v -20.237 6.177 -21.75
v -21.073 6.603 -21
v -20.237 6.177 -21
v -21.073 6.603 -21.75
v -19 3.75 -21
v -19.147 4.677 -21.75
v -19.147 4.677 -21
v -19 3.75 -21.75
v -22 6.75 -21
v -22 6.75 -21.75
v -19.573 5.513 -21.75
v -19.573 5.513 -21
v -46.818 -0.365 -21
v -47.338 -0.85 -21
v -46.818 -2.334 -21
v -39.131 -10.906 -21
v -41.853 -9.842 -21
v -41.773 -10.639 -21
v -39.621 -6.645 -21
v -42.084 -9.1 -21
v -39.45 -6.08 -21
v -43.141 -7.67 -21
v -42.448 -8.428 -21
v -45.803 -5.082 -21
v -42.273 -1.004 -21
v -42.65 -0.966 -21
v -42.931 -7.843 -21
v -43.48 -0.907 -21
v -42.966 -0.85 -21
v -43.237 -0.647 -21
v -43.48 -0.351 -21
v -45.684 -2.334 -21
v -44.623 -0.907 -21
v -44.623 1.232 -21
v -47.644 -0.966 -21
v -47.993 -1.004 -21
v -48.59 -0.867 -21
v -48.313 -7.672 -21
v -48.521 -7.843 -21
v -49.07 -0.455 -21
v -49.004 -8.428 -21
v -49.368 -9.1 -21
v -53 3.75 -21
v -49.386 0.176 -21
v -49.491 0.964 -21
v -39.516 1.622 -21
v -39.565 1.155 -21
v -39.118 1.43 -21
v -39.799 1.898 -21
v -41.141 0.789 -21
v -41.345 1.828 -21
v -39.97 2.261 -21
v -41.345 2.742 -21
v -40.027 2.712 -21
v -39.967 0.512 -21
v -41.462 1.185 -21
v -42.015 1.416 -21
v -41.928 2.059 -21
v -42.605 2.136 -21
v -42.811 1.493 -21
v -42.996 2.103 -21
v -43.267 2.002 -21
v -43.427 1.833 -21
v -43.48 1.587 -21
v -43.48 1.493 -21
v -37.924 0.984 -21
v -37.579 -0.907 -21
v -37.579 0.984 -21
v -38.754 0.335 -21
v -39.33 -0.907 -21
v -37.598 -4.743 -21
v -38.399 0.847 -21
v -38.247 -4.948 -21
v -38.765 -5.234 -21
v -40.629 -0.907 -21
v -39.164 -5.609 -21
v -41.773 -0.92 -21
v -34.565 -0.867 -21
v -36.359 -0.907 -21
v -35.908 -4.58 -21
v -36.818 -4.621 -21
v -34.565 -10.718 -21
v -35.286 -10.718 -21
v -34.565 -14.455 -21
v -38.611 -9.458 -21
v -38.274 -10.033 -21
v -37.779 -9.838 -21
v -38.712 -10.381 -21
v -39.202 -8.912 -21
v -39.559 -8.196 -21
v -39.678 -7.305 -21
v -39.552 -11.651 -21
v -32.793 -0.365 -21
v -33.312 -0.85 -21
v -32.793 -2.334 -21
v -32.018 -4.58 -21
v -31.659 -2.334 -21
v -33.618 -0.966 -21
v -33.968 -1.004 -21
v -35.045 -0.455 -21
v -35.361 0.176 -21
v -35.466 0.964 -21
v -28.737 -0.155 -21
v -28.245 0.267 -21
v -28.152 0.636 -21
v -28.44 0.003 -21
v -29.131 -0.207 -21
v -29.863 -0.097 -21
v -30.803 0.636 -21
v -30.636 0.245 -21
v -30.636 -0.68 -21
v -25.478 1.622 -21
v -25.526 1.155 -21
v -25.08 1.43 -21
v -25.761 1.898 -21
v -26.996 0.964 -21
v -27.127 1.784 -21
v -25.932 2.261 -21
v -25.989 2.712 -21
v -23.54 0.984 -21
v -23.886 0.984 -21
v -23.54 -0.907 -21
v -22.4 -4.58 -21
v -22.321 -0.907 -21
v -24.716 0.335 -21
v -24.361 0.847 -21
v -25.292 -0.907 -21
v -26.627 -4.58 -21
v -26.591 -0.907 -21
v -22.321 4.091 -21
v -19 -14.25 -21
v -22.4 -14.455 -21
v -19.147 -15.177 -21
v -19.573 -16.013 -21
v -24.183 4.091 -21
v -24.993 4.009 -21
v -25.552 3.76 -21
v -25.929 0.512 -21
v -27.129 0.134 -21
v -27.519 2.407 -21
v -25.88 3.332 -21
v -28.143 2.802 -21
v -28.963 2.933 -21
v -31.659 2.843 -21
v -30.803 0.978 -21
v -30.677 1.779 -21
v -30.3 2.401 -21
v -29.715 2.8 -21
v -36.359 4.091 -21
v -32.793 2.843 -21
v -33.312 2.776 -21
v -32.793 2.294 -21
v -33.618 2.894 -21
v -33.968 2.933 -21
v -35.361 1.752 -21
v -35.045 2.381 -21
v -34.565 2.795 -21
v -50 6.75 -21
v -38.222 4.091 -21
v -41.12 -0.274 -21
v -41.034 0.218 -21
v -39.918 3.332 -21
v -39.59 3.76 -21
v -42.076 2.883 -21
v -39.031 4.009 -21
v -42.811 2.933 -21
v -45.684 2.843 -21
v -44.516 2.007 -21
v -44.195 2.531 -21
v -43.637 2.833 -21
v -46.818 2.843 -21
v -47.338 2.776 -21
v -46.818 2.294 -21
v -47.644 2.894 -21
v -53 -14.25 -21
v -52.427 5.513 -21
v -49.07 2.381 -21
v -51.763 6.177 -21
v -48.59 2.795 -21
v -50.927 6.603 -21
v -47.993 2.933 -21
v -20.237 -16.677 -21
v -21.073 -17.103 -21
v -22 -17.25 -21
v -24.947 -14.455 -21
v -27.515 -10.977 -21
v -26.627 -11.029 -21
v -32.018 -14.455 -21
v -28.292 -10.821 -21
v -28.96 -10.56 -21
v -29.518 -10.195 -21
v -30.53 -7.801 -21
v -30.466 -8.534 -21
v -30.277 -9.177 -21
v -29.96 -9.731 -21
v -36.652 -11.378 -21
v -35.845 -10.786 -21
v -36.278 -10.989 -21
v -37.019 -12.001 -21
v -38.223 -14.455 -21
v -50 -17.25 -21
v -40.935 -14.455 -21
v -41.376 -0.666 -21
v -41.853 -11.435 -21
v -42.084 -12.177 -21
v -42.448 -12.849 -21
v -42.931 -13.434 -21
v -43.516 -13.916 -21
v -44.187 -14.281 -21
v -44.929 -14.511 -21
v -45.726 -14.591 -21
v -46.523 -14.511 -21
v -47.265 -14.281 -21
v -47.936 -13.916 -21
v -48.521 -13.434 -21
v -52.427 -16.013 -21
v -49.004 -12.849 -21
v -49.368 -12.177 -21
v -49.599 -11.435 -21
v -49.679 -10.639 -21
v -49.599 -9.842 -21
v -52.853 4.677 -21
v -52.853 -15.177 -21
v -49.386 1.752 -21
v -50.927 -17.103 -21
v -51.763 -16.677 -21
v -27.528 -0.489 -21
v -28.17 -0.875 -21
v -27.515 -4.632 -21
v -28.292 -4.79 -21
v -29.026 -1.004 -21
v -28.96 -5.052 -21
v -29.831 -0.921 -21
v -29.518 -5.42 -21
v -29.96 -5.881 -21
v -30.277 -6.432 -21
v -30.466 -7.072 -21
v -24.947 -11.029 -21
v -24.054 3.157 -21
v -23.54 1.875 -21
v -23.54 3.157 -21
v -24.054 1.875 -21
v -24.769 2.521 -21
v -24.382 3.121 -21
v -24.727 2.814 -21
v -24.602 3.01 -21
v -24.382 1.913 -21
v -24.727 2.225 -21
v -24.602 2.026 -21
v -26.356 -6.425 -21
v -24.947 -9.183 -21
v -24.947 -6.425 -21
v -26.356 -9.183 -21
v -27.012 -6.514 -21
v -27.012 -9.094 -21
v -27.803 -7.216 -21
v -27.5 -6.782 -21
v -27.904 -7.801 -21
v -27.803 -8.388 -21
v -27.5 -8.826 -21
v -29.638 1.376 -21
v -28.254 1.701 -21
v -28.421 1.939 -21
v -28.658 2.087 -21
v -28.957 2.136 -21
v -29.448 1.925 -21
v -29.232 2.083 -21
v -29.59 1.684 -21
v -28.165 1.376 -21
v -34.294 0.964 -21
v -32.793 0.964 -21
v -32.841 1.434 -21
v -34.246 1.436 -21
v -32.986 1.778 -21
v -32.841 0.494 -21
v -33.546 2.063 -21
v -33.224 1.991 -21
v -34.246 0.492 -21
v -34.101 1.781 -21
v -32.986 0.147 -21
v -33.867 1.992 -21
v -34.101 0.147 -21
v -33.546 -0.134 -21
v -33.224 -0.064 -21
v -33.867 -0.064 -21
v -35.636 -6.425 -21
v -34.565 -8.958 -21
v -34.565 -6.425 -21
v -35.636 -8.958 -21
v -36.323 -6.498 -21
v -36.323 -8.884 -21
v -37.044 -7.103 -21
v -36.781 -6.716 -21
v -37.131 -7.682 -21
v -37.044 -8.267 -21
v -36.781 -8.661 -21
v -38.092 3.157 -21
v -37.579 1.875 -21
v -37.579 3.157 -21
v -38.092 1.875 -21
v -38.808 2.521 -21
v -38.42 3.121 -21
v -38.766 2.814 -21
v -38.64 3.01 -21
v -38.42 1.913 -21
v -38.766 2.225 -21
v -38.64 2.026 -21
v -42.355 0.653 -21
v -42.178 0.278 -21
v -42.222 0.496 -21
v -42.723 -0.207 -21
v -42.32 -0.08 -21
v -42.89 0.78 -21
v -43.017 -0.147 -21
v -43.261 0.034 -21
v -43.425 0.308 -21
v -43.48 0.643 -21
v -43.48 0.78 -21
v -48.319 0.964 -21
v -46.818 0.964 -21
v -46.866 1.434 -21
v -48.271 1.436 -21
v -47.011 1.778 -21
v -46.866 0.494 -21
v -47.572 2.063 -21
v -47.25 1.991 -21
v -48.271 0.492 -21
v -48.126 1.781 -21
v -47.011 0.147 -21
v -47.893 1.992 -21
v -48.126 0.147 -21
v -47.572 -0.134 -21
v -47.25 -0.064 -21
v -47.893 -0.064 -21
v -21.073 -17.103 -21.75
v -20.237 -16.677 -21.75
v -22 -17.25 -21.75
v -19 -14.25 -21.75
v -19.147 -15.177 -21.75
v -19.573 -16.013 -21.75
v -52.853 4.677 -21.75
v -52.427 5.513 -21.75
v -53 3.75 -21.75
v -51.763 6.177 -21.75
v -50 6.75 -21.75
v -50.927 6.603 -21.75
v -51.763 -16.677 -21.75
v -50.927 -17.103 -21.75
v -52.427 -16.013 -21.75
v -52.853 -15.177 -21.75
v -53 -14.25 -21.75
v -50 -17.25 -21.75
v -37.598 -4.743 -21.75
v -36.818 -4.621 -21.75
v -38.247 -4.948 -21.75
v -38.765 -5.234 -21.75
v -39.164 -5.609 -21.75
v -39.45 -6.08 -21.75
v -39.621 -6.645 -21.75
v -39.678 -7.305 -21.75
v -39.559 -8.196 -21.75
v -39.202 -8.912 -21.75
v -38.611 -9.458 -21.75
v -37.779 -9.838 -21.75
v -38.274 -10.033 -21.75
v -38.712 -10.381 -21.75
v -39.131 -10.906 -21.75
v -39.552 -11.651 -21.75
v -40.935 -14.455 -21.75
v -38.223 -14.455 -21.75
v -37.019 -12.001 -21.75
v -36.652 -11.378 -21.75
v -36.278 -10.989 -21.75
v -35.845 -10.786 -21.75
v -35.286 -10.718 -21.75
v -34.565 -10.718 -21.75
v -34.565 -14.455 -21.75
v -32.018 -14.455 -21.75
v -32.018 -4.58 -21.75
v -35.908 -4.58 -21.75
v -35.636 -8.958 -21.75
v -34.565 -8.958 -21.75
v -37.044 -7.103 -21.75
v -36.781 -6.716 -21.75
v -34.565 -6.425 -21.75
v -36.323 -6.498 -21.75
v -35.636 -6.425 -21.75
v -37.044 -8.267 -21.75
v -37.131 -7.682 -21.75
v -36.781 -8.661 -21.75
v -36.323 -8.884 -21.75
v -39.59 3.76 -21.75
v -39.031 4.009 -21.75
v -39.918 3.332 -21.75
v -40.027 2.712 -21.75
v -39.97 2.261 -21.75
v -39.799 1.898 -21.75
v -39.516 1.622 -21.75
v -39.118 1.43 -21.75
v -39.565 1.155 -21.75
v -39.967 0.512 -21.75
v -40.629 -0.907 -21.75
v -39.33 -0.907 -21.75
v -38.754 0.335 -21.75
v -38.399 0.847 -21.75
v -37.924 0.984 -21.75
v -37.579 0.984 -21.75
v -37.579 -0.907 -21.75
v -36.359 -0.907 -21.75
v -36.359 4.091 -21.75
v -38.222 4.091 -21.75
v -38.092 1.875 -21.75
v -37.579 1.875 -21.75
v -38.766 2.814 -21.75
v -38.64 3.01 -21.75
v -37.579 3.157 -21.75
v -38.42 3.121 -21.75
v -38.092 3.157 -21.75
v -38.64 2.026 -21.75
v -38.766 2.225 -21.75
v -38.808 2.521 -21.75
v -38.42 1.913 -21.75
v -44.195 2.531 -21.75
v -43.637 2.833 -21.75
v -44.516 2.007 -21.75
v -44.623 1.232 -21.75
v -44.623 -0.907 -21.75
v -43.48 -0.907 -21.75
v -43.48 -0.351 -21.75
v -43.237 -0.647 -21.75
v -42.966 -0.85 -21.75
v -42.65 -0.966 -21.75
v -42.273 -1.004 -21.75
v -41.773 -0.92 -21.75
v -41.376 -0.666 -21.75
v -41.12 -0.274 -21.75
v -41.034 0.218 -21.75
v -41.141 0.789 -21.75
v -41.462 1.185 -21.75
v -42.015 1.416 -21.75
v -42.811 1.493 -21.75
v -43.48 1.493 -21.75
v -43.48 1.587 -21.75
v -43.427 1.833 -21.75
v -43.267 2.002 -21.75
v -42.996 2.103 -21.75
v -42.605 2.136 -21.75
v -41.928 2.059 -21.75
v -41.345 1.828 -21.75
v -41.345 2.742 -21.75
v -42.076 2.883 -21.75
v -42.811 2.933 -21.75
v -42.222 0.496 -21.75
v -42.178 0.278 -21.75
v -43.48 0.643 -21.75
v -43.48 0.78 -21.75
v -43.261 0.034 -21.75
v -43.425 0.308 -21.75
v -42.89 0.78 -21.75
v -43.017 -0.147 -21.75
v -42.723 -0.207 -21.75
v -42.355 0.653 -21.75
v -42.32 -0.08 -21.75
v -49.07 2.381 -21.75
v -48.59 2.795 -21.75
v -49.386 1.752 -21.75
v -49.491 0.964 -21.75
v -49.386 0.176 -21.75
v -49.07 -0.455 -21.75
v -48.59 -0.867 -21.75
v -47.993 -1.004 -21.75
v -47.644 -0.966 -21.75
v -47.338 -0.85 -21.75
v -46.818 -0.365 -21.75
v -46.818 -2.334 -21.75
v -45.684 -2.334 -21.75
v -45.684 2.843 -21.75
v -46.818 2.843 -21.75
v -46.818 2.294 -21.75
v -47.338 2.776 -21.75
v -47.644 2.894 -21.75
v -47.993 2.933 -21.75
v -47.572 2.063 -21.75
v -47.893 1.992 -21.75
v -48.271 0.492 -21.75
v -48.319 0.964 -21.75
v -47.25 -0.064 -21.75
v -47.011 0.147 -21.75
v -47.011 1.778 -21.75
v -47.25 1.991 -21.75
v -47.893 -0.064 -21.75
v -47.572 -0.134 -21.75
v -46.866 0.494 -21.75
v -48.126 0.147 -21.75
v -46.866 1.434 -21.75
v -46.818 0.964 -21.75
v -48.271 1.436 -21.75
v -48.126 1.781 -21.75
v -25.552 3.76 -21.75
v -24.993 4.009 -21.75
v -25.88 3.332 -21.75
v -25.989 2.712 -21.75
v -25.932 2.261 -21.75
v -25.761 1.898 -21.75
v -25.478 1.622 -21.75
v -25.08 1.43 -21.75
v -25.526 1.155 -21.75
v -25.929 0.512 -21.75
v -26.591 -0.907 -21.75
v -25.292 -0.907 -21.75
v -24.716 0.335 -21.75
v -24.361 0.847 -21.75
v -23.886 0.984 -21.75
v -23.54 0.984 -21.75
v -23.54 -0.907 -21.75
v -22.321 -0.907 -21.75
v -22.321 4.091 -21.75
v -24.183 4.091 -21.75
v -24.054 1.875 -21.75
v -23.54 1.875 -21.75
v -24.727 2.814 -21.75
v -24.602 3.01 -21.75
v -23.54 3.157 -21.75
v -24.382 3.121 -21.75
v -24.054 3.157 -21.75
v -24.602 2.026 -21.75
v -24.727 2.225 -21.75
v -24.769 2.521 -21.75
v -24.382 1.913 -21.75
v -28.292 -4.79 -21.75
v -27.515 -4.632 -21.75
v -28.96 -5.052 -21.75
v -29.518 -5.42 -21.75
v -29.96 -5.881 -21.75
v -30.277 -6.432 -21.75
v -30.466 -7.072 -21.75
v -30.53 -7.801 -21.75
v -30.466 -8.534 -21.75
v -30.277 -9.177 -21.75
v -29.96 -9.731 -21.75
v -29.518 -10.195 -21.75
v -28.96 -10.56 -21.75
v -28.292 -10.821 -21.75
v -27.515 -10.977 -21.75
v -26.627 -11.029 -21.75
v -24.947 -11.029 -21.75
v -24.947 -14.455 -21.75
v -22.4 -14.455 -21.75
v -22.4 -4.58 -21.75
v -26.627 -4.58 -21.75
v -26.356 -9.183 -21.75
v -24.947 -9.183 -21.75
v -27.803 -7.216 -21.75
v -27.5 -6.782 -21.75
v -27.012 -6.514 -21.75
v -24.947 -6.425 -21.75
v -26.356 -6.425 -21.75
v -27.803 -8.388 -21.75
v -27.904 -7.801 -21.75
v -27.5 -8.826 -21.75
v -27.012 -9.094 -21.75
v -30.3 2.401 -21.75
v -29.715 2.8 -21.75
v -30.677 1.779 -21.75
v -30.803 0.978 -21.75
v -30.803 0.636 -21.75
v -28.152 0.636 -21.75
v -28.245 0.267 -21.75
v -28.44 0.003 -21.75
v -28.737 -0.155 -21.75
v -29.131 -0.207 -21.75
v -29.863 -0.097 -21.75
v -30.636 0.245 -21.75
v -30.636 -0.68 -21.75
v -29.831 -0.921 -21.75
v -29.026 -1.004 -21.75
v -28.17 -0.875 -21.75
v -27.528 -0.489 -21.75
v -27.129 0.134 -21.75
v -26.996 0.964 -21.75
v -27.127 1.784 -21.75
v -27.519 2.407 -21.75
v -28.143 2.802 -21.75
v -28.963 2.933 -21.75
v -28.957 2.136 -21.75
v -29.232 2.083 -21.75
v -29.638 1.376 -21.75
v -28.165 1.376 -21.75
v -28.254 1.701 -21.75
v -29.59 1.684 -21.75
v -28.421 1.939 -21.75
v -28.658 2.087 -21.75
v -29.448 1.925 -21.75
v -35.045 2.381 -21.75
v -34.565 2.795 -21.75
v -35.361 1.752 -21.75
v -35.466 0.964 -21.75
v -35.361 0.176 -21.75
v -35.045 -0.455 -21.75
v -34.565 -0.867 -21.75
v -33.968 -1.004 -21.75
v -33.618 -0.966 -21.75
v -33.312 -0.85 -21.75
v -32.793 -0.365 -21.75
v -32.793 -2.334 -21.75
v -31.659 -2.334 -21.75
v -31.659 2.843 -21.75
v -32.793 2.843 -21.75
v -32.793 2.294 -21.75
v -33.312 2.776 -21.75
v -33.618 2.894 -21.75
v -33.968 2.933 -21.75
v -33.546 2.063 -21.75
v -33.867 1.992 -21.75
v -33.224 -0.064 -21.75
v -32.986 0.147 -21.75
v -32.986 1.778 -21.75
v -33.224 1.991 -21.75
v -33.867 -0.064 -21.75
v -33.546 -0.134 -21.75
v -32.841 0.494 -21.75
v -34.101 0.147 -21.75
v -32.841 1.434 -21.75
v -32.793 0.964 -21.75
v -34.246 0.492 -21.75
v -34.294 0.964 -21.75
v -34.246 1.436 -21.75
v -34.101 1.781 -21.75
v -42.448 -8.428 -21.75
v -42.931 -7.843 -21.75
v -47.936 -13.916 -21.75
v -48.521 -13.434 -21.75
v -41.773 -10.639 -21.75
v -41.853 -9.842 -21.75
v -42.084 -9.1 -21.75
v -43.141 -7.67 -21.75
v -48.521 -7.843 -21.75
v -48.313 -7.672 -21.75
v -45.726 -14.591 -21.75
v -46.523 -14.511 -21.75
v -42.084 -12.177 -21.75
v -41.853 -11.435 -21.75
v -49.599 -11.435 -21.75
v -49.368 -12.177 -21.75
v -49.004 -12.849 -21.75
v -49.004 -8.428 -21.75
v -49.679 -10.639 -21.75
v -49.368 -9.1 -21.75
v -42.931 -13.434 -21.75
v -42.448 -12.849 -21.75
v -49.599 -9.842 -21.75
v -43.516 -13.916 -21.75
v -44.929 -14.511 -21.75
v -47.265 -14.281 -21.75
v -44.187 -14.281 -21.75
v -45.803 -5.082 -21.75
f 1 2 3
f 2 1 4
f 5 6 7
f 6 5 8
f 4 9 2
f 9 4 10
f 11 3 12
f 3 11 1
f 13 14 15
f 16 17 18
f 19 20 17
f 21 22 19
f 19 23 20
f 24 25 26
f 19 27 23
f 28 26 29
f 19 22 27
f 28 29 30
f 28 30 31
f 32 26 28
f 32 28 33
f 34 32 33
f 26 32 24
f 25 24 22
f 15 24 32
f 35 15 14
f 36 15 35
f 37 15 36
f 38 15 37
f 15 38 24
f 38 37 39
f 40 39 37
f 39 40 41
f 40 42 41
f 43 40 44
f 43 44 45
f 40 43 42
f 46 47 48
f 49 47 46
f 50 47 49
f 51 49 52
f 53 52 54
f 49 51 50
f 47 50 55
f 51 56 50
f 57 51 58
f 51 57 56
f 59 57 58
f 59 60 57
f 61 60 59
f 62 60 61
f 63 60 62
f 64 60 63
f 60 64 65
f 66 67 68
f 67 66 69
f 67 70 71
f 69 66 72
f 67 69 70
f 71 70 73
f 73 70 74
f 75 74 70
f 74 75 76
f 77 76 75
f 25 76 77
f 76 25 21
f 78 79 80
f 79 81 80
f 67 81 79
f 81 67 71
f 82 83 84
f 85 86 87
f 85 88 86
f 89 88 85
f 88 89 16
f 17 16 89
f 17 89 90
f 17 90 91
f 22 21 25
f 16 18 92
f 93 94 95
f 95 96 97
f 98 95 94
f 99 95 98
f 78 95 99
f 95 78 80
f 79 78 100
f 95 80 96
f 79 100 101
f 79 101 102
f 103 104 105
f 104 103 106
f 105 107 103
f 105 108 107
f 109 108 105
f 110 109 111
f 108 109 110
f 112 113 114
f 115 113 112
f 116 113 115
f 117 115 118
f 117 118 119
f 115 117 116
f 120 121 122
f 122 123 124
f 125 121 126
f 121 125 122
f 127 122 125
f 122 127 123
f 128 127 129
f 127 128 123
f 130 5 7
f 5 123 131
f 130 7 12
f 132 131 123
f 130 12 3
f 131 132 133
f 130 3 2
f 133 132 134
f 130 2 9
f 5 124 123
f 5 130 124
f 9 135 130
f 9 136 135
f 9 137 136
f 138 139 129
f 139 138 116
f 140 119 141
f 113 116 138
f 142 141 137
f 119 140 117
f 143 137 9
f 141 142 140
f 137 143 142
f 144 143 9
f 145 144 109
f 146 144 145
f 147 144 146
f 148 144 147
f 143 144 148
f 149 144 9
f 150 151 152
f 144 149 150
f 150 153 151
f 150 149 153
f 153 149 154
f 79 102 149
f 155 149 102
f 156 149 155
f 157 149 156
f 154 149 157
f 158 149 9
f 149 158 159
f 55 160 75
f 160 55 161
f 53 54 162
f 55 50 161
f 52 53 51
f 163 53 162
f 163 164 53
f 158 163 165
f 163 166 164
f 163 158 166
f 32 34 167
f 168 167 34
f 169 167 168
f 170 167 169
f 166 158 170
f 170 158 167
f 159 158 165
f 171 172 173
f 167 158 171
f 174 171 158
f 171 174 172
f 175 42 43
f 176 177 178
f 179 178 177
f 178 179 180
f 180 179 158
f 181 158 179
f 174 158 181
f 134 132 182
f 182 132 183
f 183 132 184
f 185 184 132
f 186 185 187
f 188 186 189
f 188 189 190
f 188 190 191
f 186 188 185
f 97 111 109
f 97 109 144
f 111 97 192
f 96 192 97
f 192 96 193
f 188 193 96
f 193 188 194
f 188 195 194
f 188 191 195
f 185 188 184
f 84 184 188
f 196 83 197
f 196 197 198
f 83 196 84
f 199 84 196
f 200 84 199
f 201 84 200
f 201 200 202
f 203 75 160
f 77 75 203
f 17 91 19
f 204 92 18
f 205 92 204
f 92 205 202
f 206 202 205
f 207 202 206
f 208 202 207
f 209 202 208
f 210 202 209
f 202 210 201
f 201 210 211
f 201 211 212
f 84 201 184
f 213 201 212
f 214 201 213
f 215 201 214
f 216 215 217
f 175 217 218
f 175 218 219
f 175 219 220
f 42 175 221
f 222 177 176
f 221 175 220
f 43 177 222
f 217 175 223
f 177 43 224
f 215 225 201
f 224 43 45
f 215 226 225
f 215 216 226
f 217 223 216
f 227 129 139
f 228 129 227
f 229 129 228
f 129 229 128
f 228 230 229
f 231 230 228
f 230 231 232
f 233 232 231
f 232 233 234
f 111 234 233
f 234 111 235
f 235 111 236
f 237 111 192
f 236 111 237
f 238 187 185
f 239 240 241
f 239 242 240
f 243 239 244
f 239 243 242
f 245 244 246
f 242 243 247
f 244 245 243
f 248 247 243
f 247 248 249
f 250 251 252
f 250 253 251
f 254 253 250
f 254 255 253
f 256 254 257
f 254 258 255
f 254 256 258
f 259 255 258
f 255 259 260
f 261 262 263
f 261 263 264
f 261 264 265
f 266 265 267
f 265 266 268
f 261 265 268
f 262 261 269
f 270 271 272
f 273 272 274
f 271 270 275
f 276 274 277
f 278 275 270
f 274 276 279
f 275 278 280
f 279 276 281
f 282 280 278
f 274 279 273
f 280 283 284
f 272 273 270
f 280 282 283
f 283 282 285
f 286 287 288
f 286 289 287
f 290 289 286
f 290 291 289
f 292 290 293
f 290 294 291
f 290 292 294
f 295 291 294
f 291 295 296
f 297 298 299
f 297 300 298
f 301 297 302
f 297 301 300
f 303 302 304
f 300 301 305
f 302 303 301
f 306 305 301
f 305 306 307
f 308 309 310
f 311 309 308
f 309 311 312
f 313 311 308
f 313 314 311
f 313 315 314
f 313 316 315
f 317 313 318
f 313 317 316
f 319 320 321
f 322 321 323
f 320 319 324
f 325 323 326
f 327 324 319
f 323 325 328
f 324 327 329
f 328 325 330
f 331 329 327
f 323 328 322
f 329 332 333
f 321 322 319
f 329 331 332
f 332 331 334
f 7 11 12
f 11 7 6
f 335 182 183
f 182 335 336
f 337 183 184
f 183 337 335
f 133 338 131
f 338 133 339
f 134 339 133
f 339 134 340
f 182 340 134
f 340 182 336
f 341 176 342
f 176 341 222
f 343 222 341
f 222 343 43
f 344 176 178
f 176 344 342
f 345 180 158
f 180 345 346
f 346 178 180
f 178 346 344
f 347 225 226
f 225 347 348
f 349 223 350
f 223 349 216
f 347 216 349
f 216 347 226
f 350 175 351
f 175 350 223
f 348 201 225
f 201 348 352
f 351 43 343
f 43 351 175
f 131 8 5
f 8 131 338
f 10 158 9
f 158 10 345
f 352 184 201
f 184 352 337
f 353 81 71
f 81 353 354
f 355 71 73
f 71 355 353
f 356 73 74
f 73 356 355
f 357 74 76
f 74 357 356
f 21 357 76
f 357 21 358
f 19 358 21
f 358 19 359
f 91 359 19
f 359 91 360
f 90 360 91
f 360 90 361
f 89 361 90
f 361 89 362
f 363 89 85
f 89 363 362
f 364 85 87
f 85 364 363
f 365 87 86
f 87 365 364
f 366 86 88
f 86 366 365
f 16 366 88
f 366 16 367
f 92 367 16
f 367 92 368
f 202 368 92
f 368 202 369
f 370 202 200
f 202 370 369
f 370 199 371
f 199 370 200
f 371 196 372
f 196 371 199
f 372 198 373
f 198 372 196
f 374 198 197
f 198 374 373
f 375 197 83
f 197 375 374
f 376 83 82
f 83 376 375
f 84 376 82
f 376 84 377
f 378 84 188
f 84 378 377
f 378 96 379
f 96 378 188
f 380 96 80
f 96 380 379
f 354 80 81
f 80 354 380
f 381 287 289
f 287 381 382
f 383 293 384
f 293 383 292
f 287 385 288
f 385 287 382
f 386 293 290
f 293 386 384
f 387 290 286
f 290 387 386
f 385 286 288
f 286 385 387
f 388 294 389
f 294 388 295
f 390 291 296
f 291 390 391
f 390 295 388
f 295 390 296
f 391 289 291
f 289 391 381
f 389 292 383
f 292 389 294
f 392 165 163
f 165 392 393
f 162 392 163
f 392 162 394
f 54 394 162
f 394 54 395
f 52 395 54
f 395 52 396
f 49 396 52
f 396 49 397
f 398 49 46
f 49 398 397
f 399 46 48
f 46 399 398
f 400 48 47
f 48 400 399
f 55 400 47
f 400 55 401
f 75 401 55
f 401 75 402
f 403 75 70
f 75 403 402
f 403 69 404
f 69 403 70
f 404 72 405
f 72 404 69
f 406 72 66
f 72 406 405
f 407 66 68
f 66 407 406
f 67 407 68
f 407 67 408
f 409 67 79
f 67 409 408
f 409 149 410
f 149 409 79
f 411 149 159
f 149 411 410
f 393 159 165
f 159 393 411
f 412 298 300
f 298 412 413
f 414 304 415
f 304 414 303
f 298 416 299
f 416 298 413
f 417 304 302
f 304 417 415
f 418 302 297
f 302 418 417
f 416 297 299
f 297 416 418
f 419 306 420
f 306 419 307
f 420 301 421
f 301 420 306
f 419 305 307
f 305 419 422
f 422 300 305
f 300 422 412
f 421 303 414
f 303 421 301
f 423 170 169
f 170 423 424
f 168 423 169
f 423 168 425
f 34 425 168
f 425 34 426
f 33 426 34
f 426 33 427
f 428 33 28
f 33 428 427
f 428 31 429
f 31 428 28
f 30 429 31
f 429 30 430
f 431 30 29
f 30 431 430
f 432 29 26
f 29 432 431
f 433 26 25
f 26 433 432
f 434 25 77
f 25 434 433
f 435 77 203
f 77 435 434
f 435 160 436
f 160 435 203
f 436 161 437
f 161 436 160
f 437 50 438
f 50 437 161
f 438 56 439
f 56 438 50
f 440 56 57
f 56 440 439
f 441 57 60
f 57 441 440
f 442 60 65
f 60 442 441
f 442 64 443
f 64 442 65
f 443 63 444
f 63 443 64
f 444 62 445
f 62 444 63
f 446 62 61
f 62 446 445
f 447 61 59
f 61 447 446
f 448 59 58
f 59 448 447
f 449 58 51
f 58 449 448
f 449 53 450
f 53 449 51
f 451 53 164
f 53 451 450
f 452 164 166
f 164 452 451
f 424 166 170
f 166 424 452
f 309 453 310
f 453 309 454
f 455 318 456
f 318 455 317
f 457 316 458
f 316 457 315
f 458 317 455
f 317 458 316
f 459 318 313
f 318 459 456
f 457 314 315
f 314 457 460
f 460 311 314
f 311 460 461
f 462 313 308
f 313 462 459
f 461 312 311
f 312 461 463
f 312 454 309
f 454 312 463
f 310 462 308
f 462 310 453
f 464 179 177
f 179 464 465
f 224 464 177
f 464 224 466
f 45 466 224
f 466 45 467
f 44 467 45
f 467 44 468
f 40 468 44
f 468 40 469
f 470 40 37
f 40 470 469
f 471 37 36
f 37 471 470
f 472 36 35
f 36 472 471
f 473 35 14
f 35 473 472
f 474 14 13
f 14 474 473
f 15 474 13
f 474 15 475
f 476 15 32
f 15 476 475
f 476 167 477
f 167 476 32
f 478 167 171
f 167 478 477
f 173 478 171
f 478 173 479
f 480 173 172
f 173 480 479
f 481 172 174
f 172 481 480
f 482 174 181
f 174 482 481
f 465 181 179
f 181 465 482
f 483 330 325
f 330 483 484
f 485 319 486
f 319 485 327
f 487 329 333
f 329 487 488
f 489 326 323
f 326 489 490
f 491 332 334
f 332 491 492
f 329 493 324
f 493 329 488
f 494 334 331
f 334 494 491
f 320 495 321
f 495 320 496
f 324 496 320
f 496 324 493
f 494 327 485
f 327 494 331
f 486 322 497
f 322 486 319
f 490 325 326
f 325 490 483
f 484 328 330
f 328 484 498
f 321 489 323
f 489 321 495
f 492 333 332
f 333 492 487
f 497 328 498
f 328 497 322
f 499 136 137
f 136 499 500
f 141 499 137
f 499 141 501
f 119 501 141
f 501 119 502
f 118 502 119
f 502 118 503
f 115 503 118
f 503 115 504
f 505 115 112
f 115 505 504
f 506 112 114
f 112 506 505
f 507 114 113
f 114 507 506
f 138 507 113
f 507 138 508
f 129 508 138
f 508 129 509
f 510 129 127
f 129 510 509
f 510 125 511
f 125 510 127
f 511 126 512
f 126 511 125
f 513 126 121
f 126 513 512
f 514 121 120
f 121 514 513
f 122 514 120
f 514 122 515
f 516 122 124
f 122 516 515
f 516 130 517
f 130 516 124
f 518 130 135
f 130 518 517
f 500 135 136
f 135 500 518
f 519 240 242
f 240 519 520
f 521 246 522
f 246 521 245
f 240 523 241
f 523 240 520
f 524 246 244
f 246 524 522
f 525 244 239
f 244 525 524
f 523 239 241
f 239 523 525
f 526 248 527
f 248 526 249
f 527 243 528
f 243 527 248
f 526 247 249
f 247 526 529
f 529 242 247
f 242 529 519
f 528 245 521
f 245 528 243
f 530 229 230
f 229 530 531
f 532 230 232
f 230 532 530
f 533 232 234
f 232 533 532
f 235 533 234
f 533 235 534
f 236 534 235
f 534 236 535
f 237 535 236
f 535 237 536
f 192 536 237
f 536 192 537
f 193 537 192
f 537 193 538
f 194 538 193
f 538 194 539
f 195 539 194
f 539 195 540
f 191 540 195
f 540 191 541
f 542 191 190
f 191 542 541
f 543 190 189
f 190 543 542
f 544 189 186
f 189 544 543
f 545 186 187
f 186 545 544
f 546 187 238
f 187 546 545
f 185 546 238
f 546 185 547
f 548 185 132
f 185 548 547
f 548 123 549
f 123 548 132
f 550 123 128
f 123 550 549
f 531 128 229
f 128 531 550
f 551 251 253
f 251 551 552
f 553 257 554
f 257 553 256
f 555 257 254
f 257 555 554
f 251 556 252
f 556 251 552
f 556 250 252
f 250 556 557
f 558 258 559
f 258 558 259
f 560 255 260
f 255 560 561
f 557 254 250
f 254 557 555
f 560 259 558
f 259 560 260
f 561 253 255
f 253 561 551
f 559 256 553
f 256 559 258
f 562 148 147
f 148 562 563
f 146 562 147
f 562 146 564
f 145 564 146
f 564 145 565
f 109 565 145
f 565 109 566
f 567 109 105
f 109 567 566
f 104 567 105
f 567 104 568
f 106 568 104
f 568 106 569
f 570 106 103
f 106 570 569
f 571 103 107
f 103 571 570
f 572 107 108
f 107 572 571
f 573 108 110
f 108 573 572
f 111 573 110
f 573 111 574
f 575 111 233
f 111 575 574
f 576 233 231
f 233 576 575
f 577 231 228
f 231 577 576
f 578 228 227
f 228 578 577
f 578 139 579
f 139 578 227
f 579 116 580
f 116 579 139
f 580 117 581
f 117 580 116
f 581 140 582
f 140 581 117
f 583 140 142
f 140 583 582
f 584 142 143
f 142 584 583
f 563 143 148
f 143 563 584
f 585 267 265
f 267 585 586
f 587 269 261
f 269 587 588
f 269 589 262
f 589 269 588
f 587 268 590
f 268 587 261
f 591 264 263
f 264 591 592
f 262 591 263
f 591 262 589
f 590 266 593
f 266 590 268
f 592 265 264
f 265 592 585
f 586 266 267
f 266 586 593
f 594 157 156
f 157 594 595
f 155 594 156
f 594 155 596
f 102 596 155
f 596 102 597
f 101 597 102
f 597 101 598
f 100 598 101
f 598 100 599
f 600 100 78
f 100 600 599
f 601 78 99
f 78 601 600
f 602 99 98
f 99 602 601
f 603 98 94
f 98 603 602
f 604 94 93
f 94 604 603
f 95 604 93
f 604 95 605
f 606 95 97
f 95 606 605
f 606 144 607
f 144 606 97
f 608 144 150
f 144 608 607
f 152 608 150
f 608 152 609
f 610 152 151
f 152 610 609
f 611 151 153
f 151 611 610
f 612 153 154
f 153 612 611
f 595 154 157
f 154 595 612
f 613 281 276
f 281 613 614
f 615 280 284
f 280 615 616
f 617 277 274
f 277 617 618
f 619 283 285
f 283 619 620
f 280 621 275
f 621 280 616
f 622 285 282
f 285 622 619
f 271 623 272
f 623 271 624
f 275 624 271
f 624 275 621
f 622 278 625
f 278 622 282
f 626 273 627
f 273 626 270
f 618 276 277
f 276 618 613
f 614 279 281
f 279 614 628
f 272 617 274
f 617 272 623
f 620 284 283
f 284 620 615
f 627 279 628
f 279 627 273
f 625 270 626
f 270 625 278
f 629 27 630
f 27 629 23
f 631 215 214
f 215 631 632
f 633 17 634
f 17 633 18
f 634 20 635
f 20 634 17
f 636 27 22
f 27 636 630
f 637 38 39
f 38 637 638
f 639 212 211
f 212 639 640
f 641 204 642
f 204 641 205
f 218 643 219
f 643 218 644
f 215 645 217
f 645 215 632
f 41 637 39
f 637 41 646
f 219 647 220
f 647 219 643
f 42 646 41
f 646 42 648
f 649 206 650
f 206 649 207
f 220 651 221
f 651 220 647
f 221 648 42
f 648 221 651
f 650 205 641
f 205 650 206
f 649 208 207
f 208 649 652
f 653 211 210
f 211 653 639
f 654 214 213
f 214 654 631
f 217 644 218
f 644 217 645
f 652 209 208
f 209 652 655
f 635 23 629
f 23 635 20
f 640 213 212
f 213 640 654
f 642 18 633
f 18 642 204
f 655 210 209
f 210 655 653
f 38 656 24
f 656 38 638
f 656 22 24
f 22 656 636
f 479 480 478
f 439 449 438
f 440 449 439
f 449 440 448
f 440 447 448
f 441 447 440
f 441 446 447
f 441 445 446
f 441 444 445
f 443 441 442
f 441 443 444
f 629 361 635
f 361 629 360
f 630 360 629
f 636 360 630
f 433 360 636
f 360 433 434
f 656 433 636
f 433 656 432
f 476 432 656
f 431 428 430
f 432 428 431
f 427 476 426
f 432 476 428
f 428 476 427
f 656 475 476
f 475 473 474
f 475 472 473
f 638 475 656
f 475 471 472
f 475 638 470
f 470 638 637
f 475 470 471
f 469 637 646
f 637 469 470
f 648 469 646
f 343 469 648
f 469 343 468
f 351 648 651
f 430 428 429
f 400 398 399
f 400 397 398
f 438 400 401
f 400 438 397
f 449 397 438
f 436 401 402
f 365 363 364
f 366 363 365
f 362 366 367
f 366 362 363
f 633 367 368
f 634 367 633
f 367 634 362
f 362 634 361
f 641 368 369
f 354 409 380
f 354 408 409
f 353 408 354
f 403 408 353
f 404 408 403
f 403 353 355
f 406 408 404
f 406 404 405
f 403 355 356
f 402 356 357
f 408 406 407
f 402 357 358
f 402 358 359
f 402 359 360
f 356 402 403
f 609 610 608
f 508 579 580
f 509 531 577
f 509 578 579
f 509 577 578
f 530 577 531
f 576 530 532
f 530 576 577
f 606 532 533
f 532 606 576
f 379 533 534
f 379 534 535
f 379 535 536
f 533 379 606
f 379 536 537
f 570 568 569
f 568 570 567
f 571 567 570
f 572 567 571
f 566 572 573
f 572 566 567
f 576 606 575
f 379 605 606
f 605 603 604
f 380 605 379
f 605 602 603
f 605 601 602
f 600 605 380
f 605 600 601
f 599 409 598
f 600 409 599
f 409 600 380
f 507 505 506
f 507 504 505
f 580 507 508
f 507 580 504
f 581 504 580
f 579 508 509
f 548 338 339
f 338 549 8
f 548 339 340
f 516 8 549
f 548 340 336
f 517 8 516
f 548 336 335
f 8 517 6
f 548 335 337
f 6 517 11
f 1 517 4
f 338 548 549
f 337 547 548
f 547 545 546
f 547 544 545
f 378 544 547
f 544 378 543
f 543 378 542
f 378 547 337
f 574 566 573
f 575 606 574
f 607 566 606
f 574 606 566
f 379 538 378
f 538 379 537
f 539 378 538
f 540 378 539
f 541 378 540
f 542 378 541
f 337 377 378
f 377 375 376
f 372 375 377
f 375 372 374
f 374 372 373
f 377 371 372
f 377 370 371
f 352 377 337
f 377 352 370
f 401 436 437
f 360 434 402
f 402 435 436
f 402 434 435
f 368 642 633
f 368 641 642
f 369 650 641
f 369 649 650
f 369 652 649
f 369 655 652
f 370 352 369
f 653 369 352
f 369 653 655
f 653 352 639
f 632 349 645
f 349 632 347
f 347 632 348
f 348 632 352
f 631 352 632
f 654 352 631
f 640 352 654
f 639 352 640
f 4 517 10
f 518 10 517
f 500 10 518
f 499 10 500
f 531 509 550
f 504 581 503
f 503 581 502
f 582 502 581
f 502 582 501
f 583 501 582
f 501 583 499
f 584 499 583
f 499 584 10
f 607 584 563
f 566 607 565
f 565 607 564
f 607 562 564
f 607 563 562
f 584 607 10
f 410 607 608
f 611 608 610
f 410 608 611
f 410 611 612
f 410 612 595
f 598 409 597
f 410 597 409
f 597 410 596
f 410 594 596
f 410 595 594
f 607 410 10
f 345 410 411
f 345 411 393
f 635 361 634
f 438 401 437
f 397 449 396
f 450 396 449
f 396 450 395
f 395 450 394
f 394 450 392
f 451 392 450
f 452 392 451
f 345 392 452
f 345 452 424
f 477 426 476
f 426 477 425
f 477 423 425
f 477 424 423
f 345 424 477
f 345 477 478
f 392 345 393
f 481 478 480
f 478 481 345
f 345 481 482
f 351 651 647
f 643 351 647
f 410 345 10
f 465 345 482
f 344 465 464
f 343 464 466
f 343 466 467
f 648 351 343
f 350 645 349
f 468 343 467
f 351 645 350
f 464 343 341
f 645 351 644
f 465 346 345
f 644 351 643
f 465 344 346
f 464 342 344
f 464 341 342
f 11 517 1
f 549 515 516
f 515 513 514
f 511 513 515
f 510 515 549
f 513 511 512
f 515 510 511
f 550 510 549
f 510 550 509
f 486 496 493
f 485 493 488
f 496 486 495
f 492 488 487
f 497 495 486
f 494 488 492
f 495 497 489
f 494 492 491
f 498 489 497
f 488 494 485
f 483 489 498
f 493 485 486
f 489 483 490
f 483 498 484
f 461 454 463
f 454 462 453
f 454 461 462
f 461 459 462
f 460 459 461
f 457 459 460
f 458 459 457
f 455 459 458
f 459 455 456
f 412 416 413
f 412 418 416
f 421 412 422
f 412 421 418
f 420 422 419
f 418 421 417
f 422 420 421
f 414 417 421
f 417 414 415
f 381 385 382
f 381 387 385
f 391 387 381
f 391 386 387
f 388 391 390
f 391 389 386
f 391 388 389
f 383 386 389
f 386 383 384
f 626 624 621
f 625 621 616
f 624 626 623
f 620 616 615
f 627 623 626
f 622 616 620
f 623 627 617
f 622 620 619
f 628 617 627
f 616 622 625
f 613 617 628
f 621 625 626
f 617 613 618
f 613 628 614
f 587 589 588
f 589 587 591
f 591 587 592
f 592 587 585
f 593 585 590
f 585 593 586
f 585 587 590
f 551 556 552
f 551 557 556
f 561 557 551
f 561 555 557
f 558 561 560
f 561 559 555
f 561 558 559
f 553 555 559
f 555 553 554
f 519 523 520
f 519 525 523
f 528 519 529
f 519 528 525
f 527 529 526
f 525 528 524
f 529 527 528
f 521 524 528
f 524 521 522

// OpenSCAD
/*

	Power supply cover for 12V 20A supply.

	Adrian Bowyer
	April 2012

	Licence: GPL
*/


zi=41;              // internal height
xi=112;            // Internal width
yi=51;              // Internal depth
thick=2.5;        // Wall thickness
screw_y=26;   // Retaining screw coord
screw_z=37;   // Retaining screw coord
screw_d=3.3;  //  Retaining screw diameter
head_d=6;       //  Retaining screw head diameter
fixz=34;           // Retaining cone z coord
catchy=10;  	// catch y pos
catcha=10;
catchb=10;
catchc=25;
catchoff=[catcha/2-6,0,catchc-21+5];
c8x=23;           // IEC C8 rectangle size X
c8y=18;           // IEC C8 rectangle size Y
c8holes=30;   //  IEC C8 mounting hole centres
wx = 7;             // Low voltage wire size X
wy = 3.5;         // Low voltage wire size Y
wthick=4;        // Wire clamp thickness
whigh=20;      // Wire clamp height
wlong=20;      // Wire clamp length
basez=14;      // Indentation for bottom sheet
wallx=54;       // Wall between mains and low-voltage side
walldent1 = 50; //Wall indentations to accommodate screw connector etc
walldent2=60;
walldent3=35;

clampxyz=[-xi/2 + wlong/2 + 10, yi/2 - (wy+wthick*2)/2 - 5, -zi/2 + whigh/2 - 0.5];
logoxyz=clampxyz-[0,20,11];
screwxyz=[-xi/2, yi/2-screw_y, -zi/2 +screw_z];
catchxyz=[(xi-catcha)/2,-(yi-catchb)/2 + catchy,-(zi-catchc)/2];


//ps_cover();

intersection() { logo(); body(); }

module logo()
{
	color("green")

	translate(logoxyz)
	rotate([0,180,0])
	difference()
	{
		union()
		{
			cube([34,18,2],center=true);
			cube([28,24,2],center=true);
			for(i=[-1,1])
			{
				translate([i*(34/2-3), 18/2,0])
					cylinder(r=3,h=2,center=true,$fn=20);
				translate([i*(34/2-3),-18/2 ,0])
					cylinder(r=3,h=2,center=true,$fn=20);
			}
		}
		translate([0,0,-2.5])
		union()
		{
			poly_path3033(5);
			poly_path3045(5);
			poly_path2894(5);
			poly_path3047(5);
			poly_rect3668(5);
			poly_path3049(5);
			poly_path3039(5);
			poly_path3036(5);
			poly_path3041(5);
			poly_path3043(5);
		}
	}

}

module body()
{
			difference()
			{
				cube([xi+2*thick,yi+thick,zi+thick],center=true);
				translate([0,0,thick])
					cube([xi,yi-thick,zi+thick],center=true);
				translate([0,-yi/2,thick+basez])
					cube([xi,5*thick,zi],center=true);
			}
}

module ps_cover()
{
	difference()
	{
		union()
		{
			body();
			translate(clampxyz)
				wire_clamp();
			translate(catchxyz)
				cube([catcha,catchb,catchc],center=true);
			translate([(xi+2*thick)/2 - wallx,0,0])
				difference()
				{
					cube([thick,yi+thick,zi+thick],center=true);
					translate([0, -(yi+thick)/2, (zi+thick)/2])
						cube([5*thick,walldent1,walldent2],center=true);
					translate([0, (yi+thick)/2, (zi+thick)/2])
						cube([5*thick,walldent2,walldent3],center=true);
				}
		}
		translate([xi/2 - c8holes/2 - 10, yi/2 - c8y/2 - 5, -zi/2])
			c8_holes();
		translate(clampxyz)
			wire_holes();
		translate(screwxyz)
			rotate([0,90,0])
				cylinder(r=screw_d/2,h=10,center=true,$fn=20);
		translate(catchxyz+catchoff)
		{
			rotate([90,0,0])
				cylinder(r=1.5,h=100,center=true,$fn=20);
			translate([0,50,0])
				rotate([90,0,0])
					cylinder(r=3,h=60,center=true,$fn=20);
		}

		logo();
	}
}

module wire_holes()
{
	translate([-wthick,0,0])
		cube([wx,wy,zi*5],center=true);
	translate([wlong/2-screw_d,0,whigh/2-screw_d])
	{
		rotate([90,0,0])
			cylinder(r=screw_d/2,h=50,center=true,$fn=20);
		translate([0,5+(wy+wthick*2)/2,0])
		rotate([90,0,0])
			cylinder(r=head_d/2,h=10,center=true,$fn=20);
	}
}


module wire_clamp()
{
	difference()
	{
		cube([wlong,wy+wthick*2,whigh],center=true);
		translate([wthick,0,0])
			cube([wlong,wy,2*whigh],center=true);
	}
}


module c8_holes()
{
	union()
	{
		cube([c8x,c8y,10*thick],center=true);
		translate([-c8holes/2,0,0])
			cylinder(h=10*thick,r=screw_d/2,center=true,$fn=20);
		translate([c8holes/2,0,0])
			cylinder(h=10*thick,r=screw_d/2,center=true,$fn=20);
	}
}






// Module names are of the form poly_<inkscape-path-id>().  As a result,
// you can associate a polygon in this OpenSCAD program with the corresponding
// SVG element in the Inkscape document by looking for the XML element with
// the attribute id="inkscape-path-id".

// fudge value is used to ensure that subtracted solids are a tad taller
// in the z dimension than the polygon being subtracted from.  This helps
// keep the resulting .stl file manifold.
fudge = 0.1;

module poly_path3033(h)
{
  scale([25.4/90, -25.4/90, 1]) union()
  {
    difference()
    {
       linear_extrude(height=h)
         polygon([[-5.085352,19.374736],[-5.085352,32.616923],[-14.108789,32.616923],[-14.108789,-2.375264],[-0.327539,-2.375264],[2.898034,-2.230225],[5.660724,-1.795160],[7.960533,-1.070069],[9.797461,-0.054952],[11.212483,1.273679],[12.223219,2.939211],[12.829670,4.941647],[13.031836,7.280986],[12.609938,10.439205],[11.344336,12.976298],[9.252518,14.909905],[6.305273,16.257548],[8.057207,16.948966],[9.609961,18.179423],[11.092361,20.042714],[12.586523,22.679423],[17.484961,32.616923],[7.875586,32.616923],[3.609961,23.921611],[2.309164,21.712635],[0.984961,20.335673],[-0.550209,19.614980],[-2.530664,19.374736],[-5.085352,19.374736]]);
       translate([0, 0, -fudge])
         linear_extrude(height=h+2*fudge)
           polygon([[-1.288477,13.140361],[1.143149,12.876704],[2.766211,12.085673],[3.697835,10.691159],[4.008398,8.616923],[3.697835,6.566162],[2.766211,5.195048],[1.143149,4.421632],[-1.288477,4.163798],[-5.085352,4.163798],[-5.085352,13.140361]]);
    }
  }
}

module poly_path3045(h)
{
  scale([25.4/90, -25.4/90, 1]) union()
  {
    difference()
    {
       linear_extrude(height=h)
         polygon([[5.593479,-22.090523],[5.593479,-15.387723],[1.272512,-15.387723],[1.272512,-33.099722],[7.871806,-33.099722],[10.739349,-32.806091],[12.720269,-31.925249],[13.881868,-30.409693],[14.269083,-28.212017],[14.067053,-26.613420],[13.461006,-25.329220],[12.459317,-24.350486],[11.047998,-23.668350],[12.630482,-22.695554],[14.055840,-20.417788],[16.401508,-15.387723],[11.799959,-15.387723],[9.757320,-19.789030],[8.500311,-21.604125],[6.816817,-22.090523],[5.593479,-22.090523]]);
       translate([0, 0, -fudge])
         linear_extrude(height=h+2*fudge)
           polygon([[7.411652,-25.246177],[8.576061,-25.379632],[9.353281,-25.780028],[9.799399,-26.485890],[9.948116,-27.535806],[9.799399,-28.573840],[9.353281,-29.267857],[8.576061,-29.659337],[7.411652,-29.789845],[5.593479,-29.789845],[5.593479,-25.246177]]);
    }
  }
}

module poly_path2894(h)
{
  scale([25.4/90, -25.4/90, 1]) union()
  {
    linear_extrude(height=h)
      polygon([[48.469119,19.093223],[48.184557,21.916021],[47.368419,24.545185],[46.077029,26.924390],[44.366710,28.997314],[42.293787,30.707632],[39.914581,31.999022],[37.285418,32.815160],[34.462619,33.099722],[31.639821,32.815160],[29.010657,31.999022],[26.631452,30.707632],[24.558528,28.997314],[22.848209,26.924390],[21.556819,24.545185],[20.740681,21.916021],[20.456119,19.093223],[20.740681,16.270425],[21.556819,13.641261],[22.848209,11.262055],[24.558528,9.189132],[26.631452,7.478813],[29.010657,6.187423],[31.639821,5.371285],[34.462619,5.086723],[37.285418,5.371285],[39.914581,6.187423],[42.293787,7.478813],[44.366710,9.189132],[46.077029,11.262055],[47.368419,13.641261],[48.184557,16.270425],[48.469119,19.093223]]);
  }
}

module poly_path3047(h)
{
  scale([25.4/90, -25.4/90, 1]) union()
  {
    difference()
    {
       linear_extrude(height=h)
         polygon([[30.554078,-22.968411],[30.554078,-15.387723],[26.502470,-15.387723],[26.502470,-17.357041],[25.643881,-16.310099],[24.684297,-15.589400],[23.564768,-15.180114],[22.226395,-15.043685],[20.455918,-15.343236],[19.050203,-16.241885],[18.141116,-17.629897],[17.838088,-19.373813],[18.216873,-21.399477],[19.353232,-22.802324],[21.311694,-23.620890],[24.134355,-23.893754],[26.502470,-23.893754],[26.502470,-24.225928],[26.314472,-25.097877],[25.750509,-25.696985],[24.788106,-26.052877],[23.404841,-26.171518],[21.003057,-25.898662],[18.937970,-25.080090],[18.937970,-28.318787],[21.530551,-28.817049],[24.134355,-28.994999],[27.060821,-28.639088],[29.038934,-27.571395],[30.175282,-25.714771],[30.554078,-22.968411]]);
       translate([0, 0, -fudge])
         linear_extrude(height=h+2*fudge)
           polygon([[24.414937,-21.366857],[22.518201,-20.916049],[22.046819,-20.358468],[21.889696,-19.587353],[22.394745,-18.317974],[23.820103,-17.867166],[24.863863,-18.080705],[25.728062,-18.721328],[26.308861,-19.694120],[26.502470,-20.880460],[26.502470,-21.366857],[24.414937,-21.366857]]);
    }
  }
}

module poly_rect3668(h)
{
  scale([25.4/90, -25.4/90, 1]) union()
  {
    linear_extrude(height=h)
      polygon([[34.735515,-0.594379],[45.105917,10.103823],[34.494317,20.419423],[24.123915,9.721221]]);
  }
}

module poly_path3049(h)
{
  scale([25.4/90, -25.4/90, 1]) union()
  {
    difference()
    {
       linear_extrude(height=h)
         polygon([[38.331823,-17.309588],[38.331823,-10.333931],[34.313884,-10.333931],[34.313884,-28.674688],[38.331823,-28.674688],[38.331823,-26.729097],[40.172445,-28.437421],[41.258288,-28.855594],[42.495667,-28.994999],[44.611244,-28.505625],[46.311584,-27.037544],[47.431097,-24.810191],[47.804279,-22.019342],[47.431097,-19.225518],[46.311584,-16.989277],[44.611244,-15.530084],[42.495667,-15.043685],[41.258288,-15.180114],[40.172445,-15.589400],[38.331823,-17.309588]]);
       translate([0, 0, -fudge])
         linear_extrude(height=h+2*fudge)
           polygon([[41.002961,-25.910525],[39.860988,-25.658421],[39.016442,-24.902139],[38.502973,-23.683173],[38.331823,-22.019342],[38.502973,-20.352536],[39.016442,-19.124682],[39.860988,-18.377288],[41.002961,-18.128159],[42.139313,-18.377288],[42.967042,-19.124682],[43.480500,-20.346605],[43.651660,-22.019342],[43.480500,-23.692070],[42.967042,-24.914002],[42.139313,-25.661387]]);
    }
  }
}

module poly_path3039(h)
{
  scale([25.4/90, -25.4/90, 1]) union()
  {
    difference()
    {
       linear_extrude(height=h)
         polygon([[-44.148152,-22.090523],[-44.148152,-15.387723],[-48.469119,-15.387723],[-48.469119,-33.099722],[-41.869825,-33.099722],[-39.002282,-32.806091],[-37.021362,-31.925249],[-35.859762,-30.409693],[-35.472548,-28.212017],[-35.674578,-26.613420],[-36.280625,-25.329220],[-37.282314,-24.350486],[-38.693633,-23.668350],[-37.111149,-22.695554],[-35.685791,-20.417788],[-33.340122,-15.387723],[-37.941672,-15.387723],[-39.984311,-19.789030],[-41.241320,-21.604125],[-42.924813,-22.090523],[-44.148152,-22.090523]]);
       translate([0, 0, -fudge])
         linear_extrude(height=h+2*fudge)
           polygon([[-42.329979,-25.246177],[-41.165570,-25.379632],[-40.388349,-25.780028],[-39.942232,-26.485890],[-39.793515,-27.535806],[-39.942232,-28.573840],[-40.388349,-29.267857],[-41.165570,-29.659337],[-42.329979,-29.789845],[-44.148152,-29.789845],[-44.148152,-25.246177]]);
    }
  }
}

module poly_path3036(h)
{
  scale([25.4/90, -25.4/90, 1]) union()
  {
    difference()
    {
       linear_extrude(height=h)
         polygon([[-48.187968,-2.375264],[-33.211406,-2.375264],[-30.066400,-2.189209],[-27.311034,-1.631098],[-24.945307,-0.700929],[-22.969218,0.601298],[-21.400388,2.236080],[-20.279789,4.187257],[-19.607420,6.454830],[-19.383281,9.038798],[-19.607420,11.634512],[-20.279789,13.913812],[-21.400388,15.876699],[-22.969218,17.523173],[-24.945307,18.815172],[-27.311034,19.738026],[-30.066400,20.291735],[-33.211406,20.476298],[-39.164531,20.476298],[-39.164531,32.616923],[-48.187968,32.616923],[-48.187968,-2.375264]]);
       translate([0, 0, -fudge])
         linear_extrude(height=h+2*fudge)
           polygon([[-39.164531,4.163798],[-39.164531,13.937236],[-34.172343,13.937236],[-31.846186,13.620844],[-30.117656,12.671611],[-29.045407,11.118893],[-28.687968,9.038798],[-29.045407,6.964599],[-30.117656,5.429423],[-31.846186,4.480226],[-34.172343,4.163798]]);
    }
  }
}

module poly_path3041(h)
{
  scale([25.4/90, -25.4/90, 1]) union()
  {
    difference()
    {
       linear_extrude(height=h)
         polygon([[-18.413144,-22.066796],[-18.413144,-20.856733],[-27.807039,-20.856733],[-27.478761,-19.548794],[-26.785719,-18.614558],[-25.736347,-18.054012],[-24.339042,-17.867166],[-21.746461,-18.258656],[-19.007978,-19.468720],[-19.007978,-16.194432],[-21.858694,-15.340270],[-24.709411,-15.043685],[-27.742509,-15.500425],[-30.018028,-16.870643],[-31.432164,-19.077225],[-31.903541,-22.019342],[-31.440581,-24.922893],[-30.051697,-27.132451],[-27.840713,-28.529352],[-24.933877,-28.994999],[-22.268353,-28.523420],[-20.197648,-27.108725],[-18.859281,-24.905098],[-18.413144,-22.066796]]);
       translate([0, 0, -fudge])
         linear_extrude(height=h+2*fudge)
           polygon([[-22.543315,-23.478536],[-22.711673,-24.569958],[-23.216713,-25.424127],[-23.982709,-25.984663],[-24.956324,-26.171518],[-26.014124,-25.996526],[-26.853060,-25.471581],[-27.445092,-24.629275],[-27.762146,-23.478536]]);
    }
  }
}

module poly_path3043(h)
{
  scale([25.4/90, -25.4/90, 1]) union()
  {
    difference()
    {
       linear_extrude(height=h)
         polygon([[-11.364917,-17.309588],[-11.364917,-10.333931],[-15.382855,-10.333931],[-15.382855,-28.674688],[-11.364917,-28.674688],[-11.364917,-26.729097],[-9.524297,-28.437421],[-8.438450,-28.855594],[-7.201076,-28.994999],[-5.085494,-28.505625],[-3.385157,-27.037544],[-2.265644,-24.810191],[-1.892459,-22.019342],[-2.265644,-19.225518],[-3.385157,-16.989277],[-5.085494,-15.530084],[-7.201076,-15.043685],[-8.438450,-15.180114],[-9.524297,-15.589400],[-11.364917,-17.309588]]);
       translate([0, 0, -fudge])
         linear_extrude(height=h+2*fudge)
           polygon([[-8.693773,-25.910525],[-9.835749,-25.658421],[-10.680296,-24.902139],[-11.193766,-23.683173],[-11.364917,-22.019342],[-11.193766,-20.352536],[-10.680296,-19.124682],[-9.835749,-18.377288],[-8.693773,-18.128159],[-7.557423,-18.377288],[-6.729698,-19.124682],[-6.216240,-20.346605],[-6.045077,-22.019342],[-6.216240,-23.692070],[-6.729698,-24.914002],[-7.557423,-25.661387],[-8.693773,-25.910525]]);
    }
  }
}
